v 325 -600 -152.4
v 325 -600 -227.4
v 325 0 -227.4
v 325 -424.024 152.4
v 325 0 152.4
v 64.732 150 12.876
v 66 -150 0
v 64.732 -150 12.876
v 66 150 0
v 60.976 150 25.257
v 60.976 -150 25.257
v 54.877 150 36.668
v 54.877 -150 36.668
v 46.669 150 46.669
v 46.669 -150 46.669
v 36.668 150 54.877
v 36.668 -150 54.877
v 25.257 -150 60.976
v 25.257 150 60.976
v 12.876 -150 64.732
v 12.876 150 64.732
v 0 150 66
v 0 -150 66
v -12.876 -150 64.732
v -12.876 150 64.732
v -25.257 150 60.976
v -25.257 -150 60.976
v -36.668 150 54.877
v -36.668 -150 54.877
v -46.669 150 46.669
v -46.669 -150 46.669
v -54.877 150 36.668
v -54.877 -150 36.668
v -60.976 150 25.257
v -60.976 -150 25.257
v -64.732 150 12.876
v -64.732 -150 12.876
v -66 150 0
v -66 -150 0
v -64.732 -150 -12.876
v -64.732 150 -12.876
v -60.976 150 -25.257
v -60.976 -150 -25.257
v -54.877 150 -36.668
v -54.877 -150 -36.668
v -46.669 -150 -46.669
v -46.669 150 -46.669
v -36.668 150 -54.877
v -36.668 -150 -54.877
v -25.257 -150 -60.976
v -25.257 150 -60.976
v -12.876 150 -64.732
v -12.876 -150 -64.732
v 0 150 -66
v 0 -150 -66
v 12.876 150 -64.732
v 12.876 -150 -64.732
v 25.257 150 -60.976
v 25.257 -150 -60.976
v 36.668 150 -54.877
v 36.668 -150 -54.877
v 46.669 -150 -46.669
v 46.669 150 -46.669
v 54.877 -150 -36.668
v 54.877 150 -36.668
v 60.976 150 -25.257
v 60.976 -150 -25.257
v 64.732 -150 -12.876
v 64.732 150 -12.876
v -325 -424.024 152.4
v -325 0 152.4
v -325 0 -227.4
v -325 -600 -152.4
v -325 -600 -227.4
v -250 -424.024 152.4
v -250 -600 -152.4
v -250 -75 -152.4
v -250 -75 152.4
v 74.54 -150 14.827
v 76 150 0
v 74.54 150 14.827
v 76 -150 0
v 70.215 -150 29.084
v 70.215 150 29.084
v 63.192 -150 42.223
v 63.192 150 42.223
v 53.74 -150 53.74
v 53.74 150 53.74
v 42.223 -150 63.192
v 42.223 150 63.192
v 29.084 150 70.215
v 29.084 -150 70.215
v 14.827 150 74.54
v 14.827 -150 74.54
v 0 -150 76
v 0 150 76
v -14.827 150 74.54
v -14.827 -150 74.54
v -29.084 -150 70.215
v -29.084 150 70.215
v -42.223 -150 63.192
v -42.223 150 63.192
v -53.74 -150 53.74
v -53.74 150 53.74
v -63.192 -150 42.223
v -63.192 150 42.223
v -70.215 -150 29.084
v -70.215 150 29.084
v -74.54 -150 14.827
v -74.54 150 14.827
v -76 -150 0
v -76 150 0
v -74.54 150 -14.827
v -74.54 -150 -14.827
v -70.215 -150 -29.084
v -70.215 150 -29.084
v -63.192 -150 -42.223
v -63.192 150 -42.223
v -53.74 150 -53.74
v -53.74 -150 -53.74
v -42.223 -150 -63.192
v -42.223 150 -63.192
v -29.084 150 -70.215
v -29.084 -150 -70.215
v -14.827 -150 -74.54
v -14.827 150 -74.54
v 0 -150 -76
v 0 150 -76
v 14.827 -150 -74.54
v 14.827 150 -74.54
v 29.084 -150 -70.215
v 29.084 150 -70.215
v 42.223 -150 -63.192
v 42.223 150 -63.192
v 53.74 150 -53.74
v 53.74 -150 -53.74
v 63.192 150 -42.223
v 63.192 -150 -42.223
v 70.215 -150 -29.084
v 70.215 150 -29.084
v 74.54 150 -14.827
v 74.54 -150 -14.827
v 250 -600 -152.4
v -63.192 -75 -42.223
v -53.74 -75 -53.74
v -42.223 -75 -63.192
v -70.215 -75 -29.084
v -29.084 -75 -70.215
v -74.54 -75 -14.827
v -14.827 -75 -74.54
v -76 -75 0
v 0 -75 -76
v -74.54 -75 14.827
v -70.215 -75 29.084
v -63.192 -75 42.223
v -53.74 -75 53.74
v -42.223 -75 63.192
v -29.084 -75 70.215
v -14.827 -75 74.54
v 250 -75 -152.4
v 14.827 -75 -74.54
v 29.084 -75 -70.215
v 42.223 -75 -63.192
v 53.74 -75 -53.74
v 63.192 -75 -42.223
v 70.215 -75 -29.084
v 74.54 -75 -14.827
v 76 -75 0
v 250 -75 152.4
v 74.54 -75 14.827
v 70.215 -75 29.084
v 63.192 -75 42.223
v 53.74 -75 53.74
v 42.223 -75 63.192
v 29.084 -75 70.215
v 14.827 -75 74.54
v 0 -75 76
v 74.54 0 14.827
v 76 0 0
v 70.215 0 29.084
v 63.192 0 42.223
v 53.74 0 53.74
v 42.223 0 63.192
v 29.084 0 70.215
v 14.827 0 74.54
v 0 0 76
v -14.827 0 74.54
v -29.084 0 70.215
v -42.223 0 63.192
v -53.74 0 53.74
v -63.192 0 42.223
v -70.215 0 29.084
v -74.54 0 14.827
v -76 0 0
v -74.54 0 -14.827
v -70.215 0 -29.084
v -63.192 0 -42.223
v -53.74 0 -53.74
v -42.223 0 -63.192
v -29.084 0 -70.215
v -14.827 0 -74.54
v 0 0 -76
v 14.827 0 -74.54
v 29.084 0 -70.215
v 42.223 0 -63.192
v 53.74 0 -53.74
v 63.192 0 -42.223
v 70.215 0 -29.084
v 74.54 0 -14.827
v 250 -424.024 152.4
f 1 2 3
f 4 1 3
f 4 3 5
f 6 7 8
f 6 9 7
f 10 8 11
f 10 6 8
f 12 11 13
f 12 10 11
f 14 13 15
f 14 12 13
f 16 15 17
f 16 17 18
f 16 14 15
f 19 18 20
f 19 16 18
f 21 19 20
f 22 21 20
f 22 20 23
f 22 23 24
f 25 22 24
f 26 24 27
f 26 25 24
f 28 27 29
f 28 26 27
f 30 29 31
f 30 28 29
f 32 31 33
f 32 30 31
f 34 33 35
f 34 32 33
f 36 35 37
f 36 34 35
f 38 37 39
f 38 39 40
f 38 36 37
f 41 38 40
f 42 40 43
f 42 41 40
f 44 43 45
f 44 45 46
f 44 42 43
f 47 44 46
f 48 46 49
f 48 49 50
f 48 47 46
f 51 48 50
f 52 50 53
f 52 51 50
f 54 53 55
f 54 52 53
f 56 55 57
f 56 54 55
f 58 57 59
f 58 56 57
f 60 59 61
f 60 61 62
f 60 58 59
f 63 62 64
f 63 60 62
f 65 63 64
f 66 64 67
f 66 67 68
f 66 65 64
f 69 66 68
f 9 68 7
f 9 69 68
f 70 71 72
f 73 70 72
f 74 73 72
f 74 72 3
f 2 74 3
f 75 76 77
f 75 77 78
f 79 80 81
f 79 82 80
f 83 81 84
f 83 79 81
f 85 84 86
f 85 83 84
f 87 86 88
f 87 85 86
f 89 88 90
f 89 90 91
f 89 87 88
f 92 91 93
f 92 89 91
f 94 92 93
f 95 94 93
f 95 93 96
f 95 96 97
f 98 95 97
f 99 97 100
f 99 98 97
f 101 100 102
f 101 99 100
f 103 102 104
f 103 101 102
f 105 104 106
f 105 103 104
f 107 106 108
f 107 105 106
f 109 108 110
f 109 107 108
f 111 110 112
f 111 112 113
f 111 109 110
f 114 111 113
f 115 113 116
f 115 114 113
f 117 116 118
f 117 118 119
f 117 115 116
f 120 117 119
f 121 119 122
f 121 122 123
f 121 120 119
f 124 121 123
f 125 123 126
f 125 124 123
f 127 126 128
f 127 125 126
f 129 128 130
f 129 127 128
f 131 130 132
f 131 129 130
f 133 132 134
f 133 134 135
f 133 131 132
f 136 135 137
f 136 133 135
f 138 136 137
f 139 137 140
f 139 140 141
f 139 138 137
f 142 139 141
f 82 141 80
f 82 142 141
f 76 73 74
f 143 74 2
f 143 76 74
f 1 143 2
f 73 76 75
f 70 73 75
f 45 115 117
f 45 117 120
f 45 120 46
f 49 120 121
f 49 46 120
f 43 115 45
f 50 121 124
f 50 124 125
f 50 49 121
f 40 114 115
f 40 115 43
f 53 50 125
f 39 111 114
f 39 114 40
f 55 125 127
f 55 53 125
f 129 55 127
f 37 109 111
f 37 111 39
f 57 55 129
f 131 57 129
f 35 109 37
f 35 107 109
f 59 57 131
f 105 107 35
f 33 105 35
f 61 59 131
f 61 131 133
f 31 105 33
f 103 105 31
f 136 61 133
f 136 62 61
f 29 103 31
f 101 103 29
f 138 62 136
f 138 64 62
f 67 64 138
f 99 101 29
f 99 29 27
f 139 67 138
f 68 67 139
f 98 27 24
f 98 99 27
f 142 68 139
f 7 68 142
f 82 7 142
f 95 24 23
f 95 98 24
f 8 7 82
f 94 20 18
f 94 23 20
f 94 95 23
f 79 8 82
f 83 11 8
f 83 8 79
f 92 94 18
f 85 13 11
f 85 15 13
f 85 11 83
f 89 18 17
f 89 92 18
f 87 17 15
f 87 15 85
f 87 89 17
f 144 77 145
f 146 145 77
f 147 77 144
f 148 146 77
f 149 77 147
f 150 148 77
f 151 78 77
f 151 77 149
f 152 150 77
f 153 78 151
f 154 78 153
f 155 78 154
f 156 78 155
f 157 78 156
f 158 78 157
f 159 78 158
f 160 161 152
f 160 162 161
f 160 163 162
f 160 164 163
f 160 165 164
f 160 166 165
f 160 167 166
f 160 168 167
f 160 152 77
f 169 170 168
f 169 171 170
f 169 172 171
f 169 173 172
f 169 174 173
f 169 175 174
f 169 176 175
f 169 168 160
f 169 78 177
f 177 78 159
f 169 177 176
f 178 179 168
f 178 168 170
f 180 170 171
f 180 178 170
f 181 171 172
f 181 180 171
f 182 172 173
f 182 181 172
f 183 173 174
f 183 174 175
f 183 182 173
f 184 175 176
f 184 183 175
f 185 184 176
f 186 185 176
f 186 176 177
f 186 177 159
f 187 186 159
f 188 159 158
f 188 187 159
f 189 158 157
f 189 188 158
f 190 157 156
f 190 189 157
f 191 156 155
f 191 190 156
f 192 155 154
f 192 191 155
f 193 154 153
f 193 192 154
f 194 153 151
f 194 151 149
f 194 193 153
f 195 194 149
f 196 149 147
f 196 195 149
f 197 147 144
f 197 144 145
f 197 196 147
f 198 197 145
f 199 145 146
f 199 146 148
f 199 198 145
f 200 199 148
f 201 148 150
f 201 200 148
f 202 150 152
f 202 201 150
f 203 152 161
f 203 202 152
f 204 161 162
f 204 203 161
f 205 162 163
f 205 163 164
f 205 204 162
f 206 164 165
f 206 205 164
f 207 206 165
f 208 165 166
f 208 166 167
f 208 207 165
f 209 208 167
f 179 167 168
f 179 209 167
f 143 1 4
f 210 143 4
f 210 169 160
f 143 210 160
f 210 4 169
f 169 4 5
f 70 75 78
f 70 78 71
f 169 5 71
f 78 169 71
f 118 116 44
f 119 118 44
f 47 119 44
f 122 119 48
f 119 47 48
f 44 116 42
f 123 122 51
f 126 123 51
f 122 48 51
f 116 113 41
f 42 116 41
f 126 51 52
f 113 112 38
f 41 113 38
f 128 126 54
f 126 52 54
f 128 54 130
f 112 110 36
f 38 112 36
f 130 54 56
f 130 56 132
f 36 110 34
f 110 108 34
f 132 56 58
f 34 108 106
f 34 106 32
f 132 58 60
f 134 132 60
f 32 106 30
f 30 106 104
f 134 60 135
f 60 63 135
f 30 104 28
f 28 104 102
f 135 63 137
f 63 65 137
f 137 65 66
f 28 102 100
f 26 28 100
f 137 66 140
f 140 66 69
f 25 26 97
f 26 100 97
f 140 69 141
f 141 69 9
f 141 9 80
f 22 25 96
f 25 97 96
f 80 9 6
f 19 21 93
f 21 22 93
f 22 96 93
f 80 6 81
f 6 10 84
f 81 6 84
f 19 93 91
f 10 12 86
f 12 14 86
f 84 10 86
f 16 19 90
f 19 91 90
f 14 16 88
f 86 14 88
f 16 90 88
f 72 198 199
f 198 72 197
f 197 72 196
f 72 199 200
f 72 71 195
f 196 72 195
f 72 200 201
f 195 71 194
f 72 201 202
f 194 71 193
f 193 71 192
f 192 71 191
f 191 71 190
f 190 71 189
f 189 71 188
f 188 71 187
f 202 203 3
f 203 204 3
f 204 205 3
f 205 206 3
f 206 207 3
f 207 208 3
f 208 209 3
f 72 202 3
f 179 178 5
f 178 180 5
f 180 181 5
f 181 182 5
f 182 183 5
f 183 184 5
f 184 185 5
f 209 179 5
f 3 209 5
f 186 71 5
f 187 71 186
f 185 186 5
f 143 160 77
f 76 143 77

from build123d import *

# Parameters (mm, degrees)
F0_W     = 500
F0_H     = 304.8
F0_R     = 76
F1_DEPTH = 75
F0_R_2   = 66
F2_DEPTH = 150
F3_DEPTH = 600
F5_DEPTH = 650.001


with BuildPart() as f1:
    # F0 (on Front) → F1 (new body)
    with BuildSketch(Plane.XZ):
        Rectangle(F0_W, F0_H)
        Circle(F0_R, mode=Mode.SUBTRACT)
    extrude(amount=F1_DEPTH)

    # F0 (on Front) → F3 (join)
    with BuildSketch(Plane.XZ):
        Polygon((325, 152.4), (250, 152.4), (250, -152.4), (-250, -152.4), (-250, 152.4), (-325, 152.4), (-325, -227.4), (325, -227.4), align=None)
    extrude(amount=F3_DEPTH)

    # F4 (on face) → F5 (cut, through all)
    with BuildSketch(Plane.YZ.offset(325)):
        Polygon((-600, 152.4), (-600, -152.4), (-424.023638, 152.4), align=None)
    extrude(amount=-F5_DEPTH, mode=Mode.SUBTRACT)


with BuildPart() as f2:
    # F0 (on Front) → F2 (new body, symmetric)
    with BuildSketch(Plane.XZ):
        Circle(F0_R)
        Circle(F0_R_2, mode=Mode.SUBTRACT)
    extrude(amount=F2_DEPTH, both=True)


solid = Compound([f1.part, f2.part])
